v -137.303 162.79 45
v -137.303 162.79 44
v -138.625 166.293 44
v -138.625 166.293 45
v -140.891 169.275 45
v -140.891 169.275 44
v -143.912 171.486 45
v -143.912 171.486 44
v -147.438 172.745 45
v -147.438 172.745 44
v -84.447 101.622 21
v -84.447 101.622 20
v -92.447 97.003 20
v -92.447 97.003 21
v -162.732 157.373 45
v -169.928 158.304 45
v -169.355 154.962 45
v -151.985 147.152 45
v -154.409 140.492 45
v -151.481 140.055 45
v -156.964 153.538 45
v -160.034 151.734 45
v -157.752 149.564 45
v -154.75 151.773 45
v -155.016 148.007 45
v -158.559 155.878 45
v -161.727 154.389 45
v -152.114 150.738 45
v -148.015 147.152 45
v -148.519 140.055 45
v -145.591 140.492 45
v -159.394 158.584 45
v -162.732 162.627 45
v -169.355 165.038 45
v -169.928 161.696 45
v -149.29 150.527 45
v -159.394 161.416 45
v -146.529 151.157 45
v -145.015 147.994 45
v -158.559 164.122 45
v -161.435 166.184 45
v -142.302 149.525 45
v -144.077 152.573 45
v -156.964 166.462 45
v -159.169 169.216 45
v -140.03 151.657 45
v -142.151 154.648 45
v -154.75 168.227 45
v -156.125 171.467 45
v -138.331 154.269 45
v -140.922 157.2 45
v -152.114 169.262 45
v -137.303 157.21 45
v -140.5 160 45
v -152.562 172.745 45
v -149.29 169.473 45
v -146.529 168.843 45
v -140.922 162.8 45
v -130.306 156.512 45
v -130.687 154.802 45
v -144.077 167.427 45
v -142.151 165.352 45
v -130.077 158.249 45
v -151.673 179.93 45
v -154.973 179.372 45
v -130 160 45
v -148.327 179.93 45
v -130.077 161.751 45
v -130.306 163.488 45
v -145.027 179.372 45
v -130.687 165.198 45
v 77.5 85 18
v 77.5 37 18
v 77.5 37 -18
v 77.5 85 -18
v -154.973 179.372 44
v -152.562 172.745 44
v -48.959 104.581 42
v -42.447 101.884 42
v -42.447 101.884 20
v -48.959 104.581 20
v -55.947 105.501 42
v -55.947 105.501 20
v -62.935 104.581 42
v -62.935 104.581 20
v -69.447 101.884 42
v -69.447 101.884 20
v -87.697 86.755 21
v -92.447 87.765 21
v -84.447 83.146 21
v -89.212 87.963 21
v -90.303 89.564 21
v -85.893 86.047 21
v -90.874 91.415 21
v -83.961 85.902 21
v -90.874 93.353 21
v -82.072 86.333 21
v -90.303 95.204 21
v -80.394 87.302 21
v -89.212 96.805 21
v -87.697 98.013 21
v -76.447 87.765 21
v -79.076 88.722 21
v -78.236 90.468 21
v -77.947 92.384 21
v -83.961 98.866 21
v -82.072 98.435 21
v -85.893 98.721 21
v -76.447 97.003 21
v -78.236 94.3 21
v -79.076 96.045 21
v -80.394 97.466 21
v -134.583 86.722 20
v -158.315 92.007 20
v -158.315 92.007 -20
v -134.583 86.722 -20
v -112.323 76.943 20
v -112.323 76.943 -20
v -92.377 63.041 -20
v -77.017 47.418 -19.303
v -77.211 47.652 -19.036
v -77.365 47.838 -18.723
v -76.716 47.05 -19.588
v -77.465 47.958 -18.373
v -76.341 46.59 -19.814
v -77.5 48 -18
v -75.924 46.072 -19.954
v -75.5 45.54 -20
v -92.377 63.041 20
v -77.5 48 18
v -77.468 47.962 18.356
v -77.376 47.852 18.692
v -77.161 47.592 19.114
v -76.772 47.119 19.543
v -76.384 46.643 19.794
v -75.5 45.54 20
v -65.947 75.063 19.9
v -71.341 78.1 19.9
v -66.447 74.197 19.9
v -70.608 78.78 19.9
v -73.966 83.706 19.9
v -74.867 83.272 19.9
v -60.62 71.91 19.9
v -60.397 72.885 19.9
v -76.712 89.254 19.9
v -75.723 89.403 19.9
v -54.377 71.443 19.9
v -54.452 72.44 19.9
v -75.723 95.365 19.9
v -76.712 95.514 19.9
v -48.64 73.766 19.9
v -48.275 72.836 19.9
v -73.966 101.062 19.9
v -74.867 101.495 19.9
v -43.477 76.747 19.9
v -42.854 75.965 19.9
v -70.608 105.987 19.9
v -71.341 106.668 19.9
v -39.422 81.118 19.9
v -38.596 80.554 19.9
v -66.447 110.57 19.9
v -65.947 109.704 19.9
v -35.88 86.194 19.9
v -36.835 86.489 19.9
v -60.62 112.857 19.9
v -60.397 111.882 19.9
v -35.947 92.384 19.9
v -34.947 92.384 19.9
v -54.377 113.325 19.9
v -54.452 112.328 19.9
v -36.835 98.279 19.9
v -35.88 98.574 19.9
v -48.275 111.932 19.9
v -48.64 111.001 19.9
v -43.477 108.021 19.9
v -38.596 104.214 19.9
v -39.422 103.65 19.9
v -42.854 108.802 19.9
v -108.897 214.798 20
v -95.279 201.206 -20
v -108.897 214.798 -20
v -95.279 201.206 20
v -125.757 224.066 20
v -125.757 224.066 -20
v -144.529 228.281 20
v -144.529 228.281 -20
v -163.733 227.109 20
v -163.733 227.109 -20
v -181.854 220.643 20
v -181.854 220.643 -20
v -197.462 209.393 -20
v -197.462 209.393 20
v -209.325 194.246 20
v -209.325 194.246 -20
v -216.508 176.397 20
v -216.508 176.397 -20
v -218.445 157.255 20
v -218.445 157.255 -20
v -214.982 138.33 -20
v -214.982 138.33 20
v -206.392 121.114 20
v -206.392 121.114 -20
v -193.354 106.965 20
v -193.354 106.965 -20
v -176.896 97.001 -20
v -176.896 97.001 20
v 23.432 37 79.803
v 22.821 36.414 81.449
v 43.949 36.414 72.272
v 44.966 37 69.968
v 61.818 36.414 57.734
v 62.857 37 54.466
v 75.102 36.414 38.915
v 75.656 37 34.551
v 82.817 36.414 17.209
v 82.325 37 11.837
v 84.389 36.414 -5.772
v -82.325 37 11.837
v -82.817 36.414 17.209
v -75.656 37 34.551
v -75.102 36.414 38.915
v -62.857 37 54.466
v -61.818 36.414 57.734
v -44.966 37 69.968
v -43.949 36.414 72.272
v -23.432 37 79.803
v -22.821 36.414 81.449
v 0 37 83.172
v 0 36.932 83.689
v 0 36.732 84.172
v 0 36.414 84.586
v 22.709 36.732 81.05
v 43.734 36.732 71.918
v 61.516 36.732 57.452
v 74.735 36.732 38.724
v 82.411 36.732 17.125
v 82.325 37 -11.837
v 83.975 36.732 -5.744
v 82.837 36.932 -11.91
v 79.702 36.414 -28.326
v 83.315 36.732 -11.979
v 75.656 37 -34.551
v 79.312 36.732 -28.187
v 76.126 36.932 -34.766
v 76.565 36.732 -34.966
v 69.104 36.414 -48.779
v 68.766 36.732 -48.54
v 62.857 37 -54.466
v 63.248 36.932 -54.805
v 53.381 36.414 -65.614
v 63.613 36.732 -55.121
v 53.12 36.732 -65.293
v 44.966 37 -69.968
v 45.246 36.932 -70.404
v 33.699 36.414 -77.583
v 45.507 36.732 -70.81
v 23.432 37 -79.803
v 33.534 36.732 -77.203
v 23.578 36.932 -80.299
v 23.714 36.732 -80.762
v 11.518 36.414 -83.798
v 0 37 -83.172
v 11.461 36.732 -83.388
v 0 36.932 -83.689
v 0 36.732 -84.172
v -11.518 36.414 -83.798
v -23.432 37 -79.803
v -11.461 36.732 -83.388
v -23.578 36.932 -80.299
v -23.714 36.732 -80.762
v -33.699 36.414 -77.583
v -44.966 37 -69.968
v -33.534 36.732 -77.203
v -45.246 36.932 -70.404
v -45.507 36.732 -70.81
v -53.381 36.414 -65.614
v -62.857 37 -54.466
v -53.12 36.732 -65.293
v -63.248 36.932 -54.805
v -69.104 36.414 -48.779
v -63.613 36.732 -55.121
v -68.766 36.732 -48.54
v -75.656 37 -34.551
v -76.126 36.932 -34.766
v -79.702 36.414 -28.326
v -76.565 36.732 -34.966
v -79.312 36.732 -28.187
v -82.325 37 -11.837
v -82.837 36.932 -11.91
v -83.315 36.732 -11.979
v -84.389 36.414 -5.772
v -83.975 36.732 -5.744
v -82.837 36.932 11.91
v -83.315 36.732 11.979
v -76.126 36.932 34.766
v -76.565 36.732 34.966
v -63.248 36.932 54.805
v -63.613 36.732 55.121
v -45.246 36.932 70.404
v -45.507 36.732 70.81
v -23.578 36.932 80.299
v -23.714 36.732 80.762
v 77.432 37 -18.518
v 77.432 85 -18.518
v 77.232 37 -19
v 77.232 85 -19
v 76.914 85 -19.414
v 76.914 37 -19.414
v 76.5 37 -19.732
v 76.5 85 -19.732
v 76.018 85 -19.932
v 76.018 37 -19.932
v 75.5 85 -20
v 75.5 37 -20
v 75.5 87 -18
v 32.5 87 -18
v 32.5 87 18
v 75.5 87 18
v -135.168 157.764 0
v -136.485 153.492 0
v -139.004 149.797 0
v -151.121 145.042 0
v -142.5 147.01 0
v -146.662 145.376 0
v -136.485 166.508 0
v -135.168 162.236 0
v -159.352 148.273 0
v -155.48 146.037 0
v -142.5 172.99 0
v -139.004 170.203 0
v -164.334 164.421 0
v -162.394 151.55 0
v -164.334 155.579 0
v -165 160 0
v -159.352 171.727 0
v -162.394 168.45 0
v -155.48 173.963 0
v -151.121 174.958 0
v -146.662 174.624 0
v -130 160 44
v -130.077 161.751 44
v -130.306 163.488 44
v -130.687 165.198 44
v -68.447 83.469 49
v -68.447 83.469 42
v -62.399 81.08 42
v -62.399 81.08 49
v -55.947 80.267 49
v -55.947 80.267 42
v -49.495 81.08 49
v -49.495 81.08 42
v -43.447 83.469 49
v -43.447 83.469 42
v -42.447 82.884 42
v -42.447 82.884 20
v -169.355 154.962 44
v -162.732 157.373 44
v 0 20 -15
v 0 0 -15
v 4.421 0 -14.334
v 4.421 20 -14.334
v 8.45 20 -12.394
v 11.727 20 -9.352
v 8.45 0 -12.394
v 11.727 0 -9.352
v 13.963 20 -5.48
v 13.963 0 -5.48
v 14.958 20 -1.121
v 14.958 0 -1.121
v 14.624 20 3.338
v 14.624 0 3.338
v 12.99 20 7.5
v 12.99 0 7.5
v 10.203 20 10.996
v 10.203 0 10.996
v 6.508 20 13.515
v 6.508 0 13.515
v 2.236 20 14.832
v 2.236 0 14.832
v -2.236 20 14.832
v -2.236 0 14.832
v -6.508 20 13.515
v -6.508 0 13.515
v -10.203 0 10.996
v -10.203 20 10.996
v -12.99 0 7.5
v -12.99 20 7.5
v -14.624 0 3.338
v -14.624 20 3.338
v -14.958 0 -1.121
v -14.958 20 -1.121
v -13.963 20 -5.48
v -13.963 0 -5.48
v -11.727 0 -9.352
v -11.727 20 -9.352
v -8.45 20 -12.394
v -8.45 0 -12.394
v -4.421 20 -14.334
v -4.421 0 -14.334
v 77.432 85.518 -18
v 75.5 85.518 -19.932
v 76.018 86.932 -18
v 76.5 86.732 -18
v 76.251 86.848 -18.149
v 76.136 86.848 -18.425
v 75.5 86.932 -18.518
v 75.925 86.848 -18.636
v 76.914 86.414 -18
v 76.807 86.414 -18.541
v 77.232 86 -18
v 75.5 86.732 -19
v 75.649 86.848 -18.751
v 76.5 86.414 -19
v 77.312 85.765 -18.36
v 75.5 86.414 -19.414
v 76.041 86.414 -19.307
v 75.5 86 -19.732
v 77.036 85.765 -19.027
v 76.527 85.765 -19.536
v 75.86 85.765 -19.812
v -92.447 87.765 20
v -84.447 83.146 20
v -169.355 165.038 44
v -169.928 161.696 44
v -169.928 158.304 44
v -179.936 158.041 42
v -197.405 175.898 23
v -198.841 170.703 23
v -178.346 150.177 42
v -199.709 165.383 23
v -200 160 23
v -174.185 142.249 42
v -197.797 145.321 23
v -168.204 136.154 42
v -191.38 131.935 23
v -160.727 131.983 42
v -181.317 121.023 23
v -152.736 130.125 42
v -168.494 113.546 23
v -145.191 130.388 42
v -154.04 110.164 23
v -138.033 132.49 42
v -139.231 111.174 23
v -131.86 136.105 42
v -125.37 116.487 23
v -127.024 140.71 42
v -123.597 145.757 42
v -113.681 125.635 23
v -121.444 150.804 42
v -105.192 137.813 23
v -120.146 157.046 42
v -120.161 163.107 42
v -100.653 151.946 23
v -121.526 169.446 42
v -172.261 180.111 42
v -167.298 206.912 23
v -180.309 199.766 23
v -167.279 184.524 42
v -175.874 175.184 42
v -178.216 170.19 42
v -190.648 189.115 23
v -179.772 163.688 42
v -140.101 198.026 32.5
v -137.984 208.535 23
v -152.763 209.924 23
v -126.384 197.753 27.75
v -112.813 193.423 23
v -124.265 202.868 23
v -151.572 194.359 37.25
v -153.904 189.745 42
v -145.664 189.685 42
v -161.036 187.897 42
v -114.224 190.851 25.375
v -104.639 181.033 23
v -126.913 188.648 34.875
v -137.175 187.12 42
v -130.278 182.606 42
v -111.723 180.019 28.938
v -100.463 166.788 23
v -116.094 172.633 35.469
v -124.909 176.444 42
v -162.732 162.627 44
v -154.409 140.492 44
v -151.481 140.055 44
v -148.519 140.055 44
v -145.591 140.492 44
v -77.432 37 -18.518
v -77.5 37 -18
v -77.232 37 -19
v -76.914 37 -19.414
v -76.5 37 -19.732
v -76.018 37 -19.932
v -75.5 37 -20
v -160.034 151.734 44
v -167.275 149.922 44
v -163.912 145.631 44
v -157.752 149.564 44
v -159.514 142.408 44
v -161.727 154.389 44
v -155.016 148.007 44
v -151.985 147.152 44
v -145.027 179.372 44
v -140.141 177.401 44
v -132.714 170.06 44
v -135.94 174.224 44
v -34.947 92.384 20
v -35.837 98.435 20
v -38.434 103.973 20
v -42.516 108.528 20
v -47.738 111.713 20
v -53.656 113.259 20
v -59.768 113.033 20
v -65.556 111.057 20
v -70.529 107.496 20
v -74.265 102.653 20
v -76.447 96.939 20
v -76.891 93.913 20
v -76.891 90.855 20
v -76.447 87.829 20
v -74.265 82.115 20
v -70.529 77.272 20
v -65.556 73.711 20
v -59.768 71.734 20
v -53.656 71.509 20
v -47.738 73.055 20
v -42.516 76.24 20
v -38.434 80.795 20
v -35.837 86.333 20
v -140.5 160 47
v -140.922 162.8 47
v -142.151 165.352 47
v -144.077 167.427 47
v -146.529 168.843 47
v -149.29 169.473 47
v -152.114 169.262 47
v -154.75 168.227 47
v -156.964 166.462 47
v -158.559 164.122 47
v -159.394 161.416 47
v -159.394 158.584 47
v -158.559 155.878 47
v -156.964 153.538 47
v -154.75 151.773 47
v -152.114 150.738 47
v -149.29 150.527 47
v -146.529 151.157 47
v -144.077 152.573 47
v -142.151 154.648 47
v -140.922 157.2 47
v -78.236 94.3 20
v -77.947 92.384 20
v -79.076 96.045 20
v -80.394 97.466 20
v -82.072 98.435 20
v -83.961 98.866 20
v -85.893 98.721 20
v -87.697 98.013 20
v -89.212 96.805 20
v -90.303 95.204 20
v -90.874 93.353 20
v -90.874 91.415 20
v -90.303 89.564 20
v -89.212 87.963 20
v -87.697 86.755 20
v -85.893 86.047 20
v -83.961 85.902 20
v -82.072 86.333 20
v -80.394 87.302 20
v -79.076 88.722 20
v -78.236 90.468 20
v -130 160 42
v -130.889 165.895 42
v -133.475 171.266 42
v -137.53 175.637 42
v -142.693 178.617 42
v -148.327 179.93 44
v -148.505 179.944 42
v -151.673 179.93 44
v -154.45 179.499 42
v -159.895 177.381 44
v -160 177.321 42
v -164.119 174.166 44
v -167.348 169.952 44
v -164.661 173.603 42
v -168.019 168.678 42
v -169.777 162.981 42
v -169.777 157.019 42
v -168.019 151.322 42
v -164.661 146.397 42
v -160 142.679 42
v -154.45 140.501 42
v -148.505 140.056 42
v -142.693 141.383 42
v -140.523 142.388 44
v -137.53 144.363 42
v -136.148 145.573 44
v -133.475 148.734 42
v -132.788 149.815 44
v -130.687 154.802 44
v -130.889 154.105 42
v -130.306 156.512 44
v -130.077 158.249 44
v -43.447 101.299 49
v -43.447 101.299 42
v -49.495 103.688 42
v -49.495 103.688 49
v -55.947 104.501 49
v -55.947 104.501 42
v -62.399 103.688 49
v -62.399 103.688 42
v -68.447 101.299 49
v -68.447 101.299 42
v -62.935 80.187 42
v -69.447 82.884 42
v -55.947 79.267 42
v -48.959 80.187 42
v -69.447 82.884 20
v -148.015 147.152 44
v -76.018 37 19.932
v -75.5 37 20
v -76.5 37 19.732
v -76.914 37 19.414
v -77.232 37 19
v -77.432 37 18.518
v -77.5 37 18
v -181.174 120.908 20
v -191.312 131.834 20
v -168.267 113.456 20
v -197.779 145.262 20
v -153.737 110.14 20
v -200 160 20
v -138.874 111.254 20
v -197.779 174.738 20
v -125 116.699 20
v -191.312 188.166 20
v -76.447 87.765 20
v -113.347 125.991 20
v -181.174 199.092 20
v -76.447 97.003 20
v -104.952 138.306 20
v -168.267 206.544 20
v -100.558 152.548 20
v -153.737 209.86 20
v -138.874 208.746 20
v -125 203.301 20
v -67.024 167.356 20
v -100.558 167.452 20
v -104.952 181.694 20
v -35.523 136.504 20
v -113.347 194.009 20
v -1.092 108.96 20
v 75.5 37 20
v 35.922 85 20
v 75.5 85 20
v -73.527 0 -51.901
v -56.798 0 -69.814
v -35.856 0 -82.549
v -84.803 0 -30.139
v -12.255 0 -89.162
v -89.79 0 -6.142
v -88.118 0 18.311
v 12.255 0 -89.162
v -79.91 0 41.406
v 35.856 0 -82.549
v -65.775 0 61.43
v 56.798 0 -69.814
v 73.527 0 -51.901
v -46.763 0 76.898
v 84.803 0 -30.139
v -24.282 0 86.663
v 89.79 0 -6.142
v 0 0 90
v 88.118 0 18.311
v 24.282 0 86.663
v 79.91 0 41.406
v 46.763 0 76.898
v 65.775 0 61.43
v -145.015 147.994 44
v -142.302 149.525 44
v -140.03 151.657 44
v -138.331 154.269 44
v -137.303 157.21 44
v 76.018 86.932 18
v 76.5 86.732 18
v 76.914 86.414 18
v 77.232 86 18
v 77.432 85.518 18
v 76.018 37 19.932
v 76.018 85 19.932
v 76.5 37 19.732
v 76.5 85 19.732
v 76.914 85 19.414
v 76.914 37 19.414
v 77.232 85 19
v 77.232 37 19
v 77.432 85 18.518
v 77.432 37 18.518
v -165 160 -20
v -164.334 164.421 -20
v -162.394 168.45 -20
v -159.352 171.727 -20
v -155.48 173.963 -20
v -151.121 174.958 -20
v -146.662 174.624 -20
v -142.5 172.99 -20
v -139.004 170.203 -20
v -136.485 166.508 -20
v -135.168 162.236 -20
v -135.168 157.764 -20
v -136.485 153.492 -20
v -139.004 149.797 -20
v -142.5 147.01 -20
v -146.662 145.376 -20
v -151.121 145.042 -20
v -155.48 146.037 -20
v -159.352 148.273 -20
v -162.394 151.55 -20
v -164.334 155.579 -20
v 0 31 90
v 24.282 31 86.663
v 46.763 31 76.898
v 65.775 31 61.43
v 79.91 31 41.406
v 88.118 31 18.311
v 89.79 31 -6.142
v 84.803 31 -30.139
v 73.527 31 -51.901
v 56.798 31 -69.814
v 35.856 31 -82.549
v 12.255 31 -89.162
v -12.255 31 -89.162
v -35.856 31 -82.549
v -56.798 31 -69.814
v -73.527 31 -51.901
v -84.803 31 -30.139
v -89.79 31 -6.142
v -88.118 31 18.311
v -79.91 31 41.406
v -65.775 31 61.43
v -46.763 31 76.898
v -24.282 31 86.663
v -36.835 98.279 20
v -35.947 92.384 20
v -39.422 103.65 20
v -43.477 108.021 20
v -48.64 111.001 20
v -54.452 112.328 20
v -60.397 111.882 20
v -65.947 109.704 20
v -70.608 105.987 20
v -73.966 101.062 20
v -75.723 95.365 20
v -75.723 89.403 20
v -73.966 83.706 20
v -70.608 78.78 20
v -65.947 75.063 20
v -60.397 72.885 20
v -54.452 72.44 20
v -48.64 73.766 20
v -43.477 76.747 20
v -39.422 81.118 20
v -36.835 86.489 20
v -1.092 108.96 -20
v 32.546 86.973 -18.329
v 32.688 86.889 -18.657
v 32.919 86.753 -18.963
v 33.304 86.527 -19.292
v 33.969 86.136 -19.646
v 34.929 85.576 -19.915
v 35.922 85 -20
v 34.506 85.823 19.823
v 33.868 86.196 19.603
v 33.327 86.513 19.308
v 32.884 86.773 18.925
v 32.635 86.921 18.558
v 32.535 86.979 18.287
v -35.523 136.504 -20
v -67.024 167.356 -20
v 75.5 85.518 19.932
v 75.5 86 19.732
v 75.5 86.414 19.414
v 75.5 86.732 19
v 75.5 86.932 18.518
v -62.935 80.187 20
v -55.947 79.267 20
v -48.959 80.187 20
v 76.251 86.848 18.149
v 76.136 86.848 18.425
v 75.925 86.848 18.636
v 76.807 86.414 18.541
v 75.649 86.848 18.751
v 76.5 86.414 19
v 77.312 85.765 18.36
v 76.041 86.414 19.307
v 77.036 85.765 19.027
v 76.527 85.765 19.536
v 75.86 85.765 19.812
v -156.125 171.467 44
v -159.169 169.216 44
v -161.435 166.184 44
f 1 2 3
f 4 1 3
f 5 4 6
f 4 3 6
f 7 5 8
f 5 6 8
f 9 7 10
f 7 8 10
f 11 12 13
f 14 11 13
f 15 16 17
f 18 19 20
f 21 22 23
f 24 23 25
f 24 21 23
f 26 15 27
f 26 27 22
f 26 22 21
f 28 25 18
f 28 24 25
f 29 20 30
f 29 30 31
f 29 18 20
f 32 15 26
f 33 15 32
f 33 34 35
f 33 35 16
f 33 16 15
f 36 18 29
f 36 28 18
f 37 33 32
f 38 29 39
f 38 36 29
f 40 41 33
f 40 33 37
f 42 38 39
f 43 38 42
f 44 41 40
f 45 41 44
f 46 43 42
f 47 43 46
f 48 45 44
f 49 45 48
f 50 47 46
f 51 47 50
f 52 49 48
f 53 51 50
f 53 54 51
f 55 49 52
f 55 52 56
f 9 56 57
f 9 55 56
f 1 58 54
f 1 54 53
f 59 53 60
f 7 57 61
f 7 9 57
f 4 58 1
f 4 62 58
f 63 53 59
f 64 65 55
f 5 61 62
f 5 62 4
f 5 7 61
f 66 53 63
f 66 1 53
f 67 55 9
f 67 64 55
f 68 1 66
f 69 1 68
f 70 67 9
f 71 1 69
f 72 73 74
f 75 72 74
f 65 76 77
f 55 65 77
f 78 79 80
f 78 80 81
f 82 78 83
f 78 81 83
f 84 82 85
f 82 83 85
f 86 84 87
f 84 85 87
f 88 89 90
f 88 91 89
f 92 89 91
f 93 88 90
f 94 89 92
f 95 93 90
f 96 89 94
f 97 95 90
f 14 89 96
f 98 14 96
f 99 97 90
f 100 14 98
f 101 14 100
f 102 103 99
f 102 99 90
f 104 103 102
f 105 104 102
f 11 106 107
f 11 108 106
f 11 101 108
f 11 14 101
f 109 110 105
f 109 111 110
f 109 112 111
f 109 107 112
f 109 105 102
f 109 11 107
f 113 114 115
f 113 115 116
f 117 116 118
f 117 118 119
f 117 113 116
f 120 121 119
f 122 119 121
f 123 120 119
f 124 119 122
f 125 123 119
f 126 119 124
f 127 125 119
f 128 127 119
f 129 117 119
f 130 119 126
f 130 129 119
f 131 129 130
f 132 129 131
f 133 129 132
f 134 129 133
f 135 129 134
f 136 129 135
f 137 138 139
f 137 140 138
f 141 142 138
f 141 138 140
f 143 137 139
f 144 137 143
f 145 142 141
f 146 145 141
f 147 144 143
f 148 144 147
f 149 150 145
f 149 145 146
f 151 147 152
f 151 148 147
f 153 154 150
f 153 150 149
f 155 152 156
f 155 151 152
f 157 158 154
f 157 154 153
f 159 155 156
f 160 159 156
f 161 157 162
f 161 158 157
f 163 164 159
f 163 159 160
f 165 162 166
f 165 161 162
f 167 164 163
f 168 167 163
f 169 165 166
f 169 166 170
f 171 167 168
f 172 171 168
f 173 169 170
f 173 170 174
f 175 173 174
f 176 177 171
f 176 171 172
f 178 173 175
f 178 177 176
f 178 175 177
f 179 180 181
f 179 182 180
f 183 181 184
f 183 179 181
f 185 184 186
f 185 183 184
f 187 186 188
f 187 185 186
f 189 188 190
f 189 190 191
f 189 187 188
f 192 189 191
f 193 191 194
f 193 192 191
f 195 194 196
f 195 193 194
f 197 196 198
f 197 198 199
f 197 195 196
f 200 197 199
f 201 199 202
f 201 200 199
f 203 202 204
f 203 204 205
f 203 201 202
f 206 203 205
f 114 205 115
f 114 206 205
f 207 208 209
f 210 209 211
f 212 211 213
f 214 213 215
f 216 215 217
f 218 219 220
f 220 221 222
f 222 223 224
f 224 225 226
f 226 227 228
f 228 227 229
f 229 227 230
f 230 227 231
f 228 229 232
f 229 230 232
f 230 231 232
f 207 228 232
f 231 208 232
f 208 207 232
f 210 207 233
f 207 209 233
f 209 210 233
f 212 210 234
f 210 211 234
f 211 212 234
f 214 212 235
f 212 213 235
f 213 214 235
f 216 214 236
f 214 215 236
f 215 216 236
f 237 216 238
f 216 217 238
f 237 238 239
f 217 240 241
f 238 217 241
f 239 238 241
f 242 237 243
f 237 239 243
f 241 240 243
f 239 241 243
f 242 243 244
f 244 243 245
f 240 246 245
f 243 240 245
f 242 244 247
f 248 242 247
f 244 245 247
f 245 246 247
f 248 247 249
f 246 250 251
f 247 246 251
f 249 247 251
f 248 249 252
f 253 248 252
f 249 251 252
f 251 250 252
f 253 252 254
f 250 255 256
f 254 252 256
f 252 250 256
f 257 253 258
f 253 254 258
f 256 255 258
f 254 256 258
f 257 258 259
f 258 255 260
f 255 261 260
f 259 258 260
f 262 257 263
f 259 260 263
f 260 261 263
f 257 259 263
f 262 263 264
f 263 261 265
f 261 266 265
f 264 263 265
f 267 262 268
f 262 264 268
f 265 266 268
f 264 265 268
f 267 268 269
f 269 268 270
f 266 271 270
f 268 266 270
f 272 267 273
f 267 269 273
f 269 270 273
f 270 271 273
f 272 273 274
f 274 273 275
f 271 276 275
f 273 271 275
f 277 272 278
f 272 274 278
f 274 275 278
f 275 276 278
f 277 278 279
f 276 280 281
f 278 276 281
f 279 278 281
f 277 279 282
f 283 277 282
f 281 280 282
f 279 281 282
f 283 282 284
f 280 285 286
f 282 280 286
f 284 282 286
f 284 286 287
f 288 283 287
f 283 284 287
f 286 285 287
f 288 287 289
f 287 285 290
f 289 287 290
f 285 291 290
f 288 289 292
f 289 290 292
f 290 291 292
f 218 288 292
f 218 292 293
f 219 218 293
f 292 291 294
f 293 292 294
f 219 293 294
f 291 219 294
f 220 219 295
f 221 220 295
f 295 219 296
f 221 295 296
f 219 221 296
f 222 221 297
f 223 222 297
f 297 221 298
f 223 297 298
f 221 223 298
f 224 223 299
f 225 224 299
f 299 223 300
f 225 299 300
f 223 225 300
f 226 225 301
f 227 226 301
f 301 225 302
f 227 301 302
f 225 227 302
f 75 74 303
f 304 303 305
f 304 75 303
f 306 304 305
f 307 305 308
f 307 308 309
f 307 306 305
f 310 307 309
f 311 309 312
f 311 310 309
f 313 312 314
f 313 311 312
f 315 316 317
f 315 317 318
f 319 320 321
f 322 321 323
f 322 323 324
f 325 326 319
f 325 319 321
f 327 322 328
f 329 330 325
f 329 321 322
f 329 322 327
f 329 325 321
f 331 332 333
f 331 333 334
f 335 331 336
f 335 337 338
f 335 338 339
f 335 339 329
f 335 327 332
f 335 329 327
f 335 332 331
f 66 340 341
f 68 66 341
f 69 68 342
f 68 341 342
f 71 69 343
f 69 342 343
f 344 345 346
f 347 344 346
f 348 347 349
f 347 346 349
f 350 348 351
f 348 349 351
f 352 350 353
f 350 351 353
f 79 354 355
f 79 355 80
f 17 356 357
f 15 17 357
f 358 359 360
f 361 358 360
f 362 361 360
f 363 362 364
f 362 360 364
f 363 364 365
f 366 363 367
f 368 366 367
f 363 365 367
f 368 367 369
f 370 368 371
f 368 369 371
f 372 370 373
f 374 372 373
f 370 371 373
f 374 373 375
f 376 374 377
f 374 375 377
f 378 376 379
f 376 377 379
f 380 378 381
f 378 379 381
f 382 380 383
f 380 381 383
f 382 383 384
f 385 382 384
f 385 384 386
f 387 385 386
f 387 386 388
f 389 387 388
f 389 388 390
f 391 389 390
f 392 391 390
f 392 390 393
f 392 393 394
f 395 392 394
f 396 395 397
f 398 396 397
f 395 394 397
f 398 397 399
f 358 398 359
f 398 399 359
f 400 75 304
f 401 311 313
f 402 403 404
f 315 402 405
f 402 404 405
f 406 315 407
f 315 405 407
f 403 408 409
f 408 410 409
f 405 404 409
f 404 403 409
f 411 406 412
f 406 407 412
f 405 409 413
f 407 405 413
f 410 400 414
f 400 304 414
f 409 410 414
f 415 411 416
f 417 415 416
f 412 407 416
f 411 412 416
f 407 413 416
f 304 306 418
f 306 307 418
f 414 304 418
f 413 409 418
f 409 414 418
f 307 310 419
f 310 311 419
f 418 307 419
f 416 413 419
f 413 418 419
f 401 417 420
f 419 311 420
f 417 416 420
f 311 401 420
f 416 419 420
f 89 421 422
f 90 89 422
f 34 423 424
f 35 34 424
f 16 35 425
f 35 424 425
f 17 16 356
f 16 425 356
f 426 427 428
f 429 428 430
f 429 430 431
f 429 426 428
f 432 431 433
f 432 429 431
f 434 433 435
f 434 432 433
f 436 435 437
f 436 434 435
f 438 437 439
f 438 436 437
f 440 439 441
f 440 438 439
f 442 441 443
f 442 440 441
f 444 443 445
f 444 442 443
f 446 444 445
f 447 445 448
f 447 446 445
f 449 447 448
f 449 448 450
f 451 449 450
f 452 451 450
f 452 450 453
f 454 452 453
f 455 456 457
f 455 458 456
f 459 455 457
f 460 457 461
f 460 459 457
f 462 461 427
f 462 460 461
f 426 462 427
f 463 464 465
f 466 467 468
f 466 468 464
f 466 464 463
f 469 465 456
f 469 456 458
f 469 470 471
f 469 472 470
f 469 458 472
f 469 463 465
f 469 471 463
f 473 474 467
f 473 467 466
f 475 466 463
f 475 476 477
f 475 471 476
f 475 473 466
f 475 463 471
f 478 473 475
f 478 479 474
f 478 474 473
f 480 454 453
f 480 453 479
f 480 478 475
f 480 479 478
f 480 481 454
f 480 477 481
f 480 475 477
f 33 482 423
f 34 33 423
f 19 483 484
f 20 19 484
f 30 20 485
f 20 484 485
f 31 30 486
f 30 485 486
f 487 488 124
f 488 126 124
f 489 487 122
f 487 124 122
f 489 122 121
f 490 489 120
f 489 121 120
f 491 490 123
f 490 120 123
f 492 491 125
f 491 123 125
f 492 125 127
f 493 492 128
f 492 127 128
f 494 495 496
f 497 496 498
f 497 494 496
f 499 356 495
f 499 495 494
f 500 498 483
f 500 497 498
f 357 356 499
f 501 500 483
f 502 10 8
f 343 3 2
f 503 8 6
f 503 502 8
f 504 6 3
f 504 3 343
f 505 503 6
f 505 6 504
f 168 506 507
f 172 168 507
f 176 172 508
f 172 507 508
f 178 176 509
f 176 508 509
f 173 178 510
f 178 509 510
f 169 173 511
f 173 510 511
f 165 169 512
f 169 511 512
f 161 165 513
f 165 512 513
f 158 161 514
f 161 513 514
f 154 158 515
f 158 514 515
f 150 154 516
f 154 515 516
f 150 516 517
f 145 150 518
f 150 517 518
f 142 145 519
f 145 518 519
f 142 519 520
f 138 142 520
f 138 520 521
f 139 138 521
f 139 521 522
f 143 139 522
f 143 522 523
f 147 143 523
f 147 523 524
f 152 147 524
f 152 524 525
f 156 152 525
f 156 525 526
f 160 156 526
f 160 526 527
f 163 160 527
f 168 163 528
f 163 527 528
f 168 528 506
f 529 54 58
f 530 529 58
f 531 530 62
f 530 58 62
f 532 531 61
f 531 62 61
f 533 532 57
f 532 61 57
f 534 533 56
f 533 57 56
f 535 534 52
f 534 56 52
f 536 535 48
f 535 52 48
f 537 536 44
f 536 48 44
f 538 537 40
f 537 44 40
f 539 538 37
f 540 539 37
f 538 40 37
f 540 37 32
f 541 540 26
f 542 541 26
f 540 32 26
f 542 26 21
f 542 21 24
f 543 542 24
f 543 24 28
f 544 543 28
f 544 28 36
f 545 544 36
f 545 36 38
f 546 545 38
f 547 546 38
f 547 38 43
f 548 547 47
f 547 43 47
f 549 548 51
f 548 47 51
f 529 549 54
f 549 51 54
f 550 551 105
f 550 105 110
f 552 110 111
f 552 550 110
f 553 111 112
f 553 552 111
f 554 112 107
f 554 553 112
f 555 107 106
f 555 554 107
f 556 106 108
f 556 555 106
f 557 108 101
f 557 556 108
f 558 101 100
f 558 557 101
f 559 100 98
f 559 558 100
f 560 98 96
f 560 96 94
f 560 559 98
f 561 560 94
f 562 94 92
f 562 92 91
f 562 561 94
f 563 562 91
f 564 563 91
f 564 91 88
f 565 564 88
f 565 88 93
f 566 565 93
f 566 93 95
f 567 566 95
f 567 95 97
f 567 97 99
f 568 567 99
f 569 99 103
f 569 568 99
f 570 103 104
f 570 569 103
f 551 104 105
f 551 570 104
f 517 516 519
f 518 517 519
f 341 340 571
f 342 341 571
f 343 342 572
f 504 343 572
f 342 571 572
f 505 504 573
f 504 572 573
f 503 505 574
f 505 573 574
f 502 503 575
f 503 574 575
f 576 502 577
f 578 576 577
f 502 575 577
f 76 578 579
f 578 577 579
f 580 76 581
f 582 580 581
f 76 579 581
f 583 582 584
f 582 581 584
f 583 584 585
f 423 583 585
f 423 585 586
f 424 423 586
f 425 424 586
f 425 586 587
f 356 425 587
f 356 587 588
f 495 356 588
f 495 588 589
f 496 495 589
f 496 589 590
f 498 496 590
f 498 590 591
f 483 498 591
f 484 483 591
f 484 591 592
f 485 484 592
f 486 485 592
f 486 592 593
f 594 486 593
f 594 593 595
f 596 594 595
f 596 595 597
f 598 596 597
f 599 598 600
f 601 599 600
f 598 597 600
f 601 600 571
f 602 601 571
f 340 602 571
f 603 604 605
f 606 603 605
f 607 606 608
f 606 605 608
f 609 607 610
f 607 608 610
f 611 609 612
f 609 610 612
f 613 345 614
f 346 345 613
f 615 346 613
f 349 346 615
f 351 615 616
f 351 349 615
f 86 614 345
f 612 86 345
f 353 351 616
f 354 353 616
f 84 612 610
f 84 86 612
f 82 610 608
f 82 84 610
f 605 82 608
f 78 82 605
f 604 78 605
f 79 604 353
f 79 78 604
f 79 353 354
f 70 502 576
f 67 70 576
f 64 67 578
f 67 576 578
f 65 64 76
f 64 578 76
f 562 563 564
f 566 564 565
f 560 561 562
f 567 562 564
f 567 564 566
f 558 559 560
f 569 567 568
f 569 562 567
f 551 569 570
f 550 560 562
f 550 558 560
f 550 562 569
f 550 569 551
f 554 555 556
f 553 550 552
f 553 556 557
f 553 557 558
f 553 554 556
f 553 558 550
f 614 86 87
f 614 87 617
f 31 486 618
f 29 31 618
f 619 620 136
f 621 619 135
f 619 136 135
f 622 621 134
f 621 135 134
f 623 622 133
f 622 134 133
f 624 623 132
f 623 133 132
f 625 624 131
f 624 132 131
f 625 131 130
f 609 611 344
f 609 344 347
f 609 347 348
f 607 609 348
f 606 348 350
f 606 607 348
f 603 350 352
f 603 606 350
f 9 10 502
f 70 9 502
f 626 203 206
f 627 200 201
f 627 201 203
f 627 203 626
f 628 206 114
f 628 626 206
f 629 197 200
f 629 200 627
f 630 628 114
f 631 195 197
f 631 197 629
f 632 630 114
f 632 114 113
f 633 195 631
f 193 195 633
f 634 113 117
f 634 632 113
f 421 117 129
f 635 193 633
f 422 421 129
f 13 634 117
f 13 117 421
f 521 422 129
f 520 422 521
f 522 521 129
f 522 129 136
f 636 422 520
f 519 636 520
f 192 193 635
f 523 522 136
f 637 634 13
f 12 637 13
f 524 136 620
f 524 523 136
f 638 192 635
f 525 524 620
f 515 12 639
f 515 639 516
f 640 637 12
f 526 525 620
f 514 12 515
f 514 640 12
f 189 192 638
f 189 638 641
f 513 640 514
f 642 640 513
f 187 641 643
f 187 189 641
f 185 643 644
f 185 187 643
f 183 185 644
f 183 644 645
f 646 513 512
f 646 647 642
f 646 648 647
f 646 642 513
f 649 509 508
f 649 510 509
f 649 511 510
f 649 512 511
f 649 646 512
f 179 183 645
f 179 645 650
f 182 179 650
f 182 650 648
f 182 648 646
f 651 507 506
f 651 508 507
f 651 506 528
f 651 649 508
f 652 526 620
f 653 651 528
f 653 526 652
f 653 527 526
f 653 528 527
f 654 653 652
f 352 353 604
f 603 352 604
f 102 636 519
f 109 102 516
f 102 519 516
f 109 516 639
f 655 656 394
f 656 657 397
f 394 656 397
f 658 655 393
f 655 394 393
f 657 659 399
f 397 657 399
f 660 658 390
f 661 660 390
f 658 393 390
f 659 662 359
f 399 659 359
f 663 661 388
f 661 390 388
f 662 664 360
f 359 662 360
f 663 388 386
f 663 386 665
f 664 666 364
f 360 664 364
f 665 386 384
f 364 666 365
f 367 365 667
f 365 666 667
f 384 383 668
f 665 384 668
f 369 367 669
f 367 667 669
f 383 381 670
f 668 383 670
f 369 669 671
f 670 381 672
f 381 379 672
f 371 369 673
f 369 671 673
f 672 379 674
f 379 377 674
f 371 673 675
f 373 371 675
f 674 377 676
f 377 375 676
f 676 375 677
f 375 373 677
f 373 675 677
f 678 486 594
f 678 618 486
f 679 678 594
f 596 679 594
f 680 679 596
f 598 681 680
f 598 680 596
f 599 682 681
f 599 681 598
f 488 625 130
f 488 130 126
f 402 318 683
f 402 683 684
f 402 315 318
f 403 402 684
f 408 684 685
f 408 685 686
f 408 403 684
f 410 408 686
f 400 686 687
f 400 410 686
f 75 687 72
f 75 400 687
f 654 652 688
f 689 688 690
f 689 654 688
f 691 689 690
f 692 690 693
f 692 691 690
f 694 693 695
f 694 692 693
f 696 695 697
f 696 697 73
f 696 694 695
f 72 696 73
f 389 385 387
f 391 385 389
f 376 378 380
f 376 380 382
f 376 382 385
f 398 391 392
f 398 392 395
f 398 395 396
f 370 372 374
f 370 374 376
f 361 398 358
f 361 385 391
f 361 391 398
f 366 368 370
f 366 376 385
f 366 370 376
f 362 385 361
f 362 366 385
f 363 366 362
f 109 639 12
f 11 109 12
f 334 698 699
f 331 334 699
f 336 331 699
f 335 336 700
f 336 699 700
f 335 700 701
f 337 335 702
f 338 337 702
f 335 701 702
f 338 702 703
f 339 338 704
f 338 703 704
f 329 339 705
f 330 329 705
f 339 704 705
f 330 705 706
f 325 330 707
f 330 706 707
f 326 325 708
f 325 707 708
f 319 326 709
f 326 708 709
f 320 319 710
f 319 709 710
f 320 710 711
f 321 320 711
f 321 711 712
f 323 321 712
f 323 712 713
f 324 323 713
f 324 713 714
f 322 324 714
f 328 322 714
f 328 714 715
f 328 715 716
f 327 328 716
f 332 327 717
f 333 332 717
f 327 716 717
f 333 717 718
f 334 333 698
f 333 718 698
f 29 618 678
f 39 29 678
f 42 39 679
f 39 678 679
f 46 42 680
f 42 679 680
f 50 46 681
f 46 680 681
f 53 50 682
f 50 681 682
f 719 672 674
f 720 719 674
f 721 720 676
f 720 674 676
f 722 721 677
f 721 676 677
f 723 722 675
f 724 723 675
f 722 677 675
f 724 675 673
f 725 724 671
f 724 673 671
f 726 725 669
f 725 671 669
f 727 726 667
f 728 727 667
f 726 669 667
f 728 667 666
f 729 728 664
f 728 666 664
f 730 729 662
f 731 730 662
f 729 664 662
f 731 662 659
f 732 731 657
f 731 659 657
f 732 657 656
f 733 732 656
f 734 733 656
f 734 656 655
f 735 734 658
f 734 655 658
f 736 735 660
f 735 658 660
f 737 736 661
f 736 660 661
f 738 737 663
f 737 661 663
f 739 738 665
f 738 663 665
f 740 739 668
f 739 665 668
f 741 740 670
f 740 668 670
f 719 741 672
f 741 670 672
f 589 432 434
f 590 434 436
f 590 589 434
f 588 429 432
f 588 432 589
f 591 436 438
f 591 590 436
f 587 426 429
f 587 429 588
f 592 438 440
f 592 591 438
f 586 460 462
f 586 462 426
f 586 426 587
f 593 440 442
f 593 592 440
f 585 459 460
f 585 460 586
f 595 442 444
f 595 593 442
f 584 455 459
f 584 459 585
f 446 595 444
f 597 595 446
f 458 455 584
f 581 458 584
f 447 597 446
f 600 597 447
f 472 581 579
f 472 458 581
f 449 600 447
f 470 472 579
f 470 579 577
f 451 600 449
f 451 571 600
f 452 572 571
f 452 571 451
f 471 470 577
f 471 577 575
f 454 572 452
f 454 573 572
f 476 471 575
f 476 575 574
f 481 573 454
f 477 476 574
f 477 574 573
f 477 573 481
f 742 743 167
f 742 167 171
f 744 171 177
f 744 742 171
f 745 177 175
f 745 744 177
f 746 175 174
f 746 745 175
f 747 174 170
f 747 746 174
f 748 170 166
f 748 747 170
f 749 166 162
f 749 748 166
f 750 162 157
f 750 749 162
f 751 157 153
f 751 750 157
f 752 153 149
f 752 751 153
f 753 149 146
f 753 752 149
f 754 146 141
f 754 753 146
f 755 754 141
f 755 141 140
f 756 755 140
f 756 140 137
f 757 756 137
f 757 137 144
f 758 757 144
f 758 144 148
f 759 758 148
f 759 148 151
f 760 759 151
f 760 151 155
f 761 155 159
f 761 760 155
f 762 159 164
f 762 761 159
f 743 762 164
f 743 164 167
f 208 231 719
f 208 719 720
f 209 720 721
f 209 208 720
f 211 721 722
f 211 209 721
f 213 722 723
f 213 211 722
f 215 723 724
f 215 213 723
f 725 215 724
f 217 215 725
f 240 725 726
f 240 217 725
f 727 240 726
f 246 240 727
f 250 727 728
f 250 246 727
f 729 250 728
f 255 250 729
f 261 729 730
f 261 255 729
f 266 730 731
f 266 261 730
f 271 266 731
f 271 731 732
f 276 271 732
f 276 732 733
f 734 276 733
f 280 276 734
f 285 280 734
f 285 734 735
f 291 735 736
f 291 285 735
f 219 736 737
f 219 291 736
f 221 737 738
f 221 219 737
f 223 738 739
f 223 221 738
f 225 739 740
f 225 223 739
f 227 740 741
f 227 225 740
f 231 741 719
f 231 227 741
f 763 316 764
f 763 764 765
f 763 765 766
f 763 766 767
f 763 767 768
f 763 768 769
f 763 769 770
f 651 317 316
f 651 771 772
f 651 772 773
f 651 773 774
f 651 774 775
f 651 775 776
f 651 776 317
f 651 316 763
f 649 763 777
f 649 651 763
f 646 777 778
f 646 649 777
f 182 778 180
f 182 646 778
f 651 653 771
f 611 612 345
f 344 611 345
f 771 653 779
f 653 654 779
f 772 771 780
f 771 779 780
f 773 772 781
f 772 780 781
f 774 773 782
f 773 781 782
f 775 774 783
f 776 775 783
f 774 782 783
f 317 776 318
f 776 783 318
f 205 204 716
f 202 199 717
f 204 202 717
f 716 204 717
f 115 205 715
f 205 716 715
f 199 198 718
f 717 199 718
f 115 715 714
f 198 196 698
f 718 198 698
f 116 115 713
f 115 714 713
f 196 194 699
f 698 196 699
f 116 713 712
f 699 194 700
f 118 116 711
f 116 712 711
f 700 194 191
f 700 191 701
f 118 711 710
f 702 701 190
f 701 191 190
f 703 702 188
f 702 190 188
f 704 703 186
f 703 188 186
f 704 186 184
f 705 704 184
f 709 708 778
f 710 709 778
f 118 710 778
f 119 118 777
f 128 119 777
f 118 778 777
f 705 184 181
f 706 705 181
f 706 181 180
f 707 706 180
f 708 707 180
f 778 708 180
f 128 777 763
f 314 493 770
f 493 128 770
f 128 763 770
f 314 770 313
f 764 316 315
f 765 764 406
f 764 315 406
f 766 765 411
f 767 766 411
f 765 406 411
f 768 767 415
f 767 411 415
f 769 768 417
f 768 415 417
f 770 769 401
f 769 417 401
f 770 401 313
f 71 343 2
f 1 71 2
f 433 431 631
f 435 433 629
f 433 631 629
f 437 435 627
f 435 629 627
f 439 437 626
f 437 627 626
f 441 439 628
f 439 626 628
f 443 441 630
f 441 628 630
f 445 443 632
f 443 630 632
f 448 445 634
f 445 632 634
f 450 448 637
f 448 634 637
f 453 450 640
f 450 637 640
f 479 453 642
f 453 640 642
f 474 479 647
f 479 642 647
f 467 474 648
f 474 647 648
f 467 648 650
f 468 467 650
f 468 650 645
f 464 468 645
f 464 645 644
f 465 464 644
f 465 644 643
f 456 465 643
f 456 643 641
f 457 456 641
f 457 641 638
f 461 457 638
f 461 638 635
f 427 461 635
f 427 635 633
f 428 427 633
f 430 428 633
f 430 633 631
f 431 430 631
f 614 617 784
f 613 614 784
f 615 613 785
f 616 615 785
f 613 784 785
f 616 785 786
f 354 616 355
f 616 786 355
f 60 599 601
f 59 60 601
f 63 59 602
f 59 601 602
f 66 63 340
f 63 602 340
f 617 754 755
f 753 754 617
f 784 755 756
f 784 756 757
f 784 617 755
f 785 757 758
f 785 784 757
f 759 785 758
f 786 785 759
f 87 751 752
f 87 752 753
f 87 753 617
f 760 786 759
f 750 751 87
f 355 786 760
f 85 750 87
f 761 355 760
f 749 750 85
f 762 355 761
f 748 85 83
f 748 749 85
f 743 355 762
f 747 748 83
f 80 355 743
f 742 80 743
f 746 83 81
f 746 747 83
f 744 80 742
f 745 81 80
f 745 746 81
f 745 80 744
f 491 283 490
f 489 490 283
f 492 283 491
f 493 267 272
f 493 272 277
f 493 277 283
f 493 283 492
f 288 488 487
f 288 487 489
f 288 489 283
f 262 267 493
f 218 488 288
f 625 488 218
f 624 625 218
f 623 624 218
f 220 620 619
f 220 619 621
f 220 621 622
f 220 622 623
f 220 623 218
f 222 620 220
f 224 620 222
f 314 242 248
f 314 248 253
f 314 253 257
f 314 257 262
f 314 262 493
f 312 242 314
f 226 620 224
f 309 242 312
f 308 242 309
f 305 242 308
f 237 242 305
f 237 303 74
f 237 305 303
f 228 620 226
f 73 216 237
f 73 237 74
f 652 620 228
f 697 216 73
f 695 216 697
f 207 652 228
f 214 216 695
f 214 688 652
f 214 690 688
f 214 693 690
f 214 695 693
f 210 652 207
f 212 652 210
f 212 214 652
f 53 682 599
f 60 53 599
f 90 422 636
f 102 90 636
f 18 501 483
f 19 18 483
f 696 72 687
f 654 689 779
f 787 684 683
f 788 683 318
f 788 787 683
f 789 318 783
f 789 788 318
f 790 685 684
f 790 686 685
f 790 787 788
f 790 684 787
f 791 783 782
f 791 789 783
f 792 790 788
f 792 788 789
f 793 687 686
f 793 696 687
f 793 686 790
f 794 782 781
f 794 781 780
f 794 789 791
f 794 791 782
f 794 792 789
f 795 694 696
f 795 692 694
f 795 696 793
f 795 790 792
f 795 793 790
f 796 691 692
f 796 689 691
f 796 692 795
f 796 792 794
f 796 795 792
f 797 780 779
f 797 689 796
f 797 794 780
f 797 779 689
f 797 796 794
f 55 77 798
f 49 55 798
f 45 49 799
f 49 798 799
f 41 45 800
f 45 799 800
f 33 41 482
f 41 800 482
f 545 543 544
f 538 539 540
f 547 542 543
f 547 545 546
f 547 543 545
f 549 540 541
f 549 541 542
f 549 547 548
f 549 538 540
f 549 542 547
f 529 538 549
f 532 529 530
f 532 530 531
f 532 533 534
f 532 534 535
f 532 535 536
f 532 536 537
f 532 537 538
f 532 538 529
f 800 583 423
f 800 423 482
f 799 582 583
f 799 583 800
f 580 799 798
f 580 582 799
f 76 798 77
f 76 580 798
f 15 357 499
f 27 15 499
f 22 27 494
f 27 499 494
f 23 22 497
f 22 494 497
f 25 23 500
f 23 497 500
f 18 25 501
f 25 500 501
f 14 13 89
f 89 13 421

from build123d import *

# Parameters (mm, degrees)
SKETCH1_R            = 90
BOSS_EXTRUDE1_DEPTH  = 37
CHAMFER1_SIZE        = 6
SKETCH2_W            = 155
SKETCH2_H            = 40
BOSS_EXTRUDE2_DEPTH  = 50
CUT_EXTRUDE1_DEPTH   = 40
BOSS_EXTRUDE3_DEPTH  = 20
SKETCH8_R            = 50
BOSS_EXTRUDE4_DEPTH  = 3
SKETCH12_R           = 20
BOSS_EXTRUDE5_DEPTH  = 2
BOSS_EXTRUDE6_DEPTH  = 1
SKETCH14_R           = 9.5
BOSS_EXTRUDE7_DEPTH  = 2
BOSS_EXTRUDE9_DEPTH  = 22
BOSS_EXTRUDE10_DEPTH = 7
SKETCH18_R           = 6.5
BOSS_EXTRUDE11_DEPTH = 1
SKETCH19_R           = 21
SKETCH19_R_2         = 20
CUT_EXTRUDE12_DEPTH  = 0.1
FILLET1_R            = 2
SKETCH20_R           = 15
CUT_EXTRUDE13_DEPTH  = 20
SKETCH21_R           = 15
CUT_EXTRUDE14_DEPTH  = 20


with BuildPart() as part:
    # Sketch1 → Boss-Extrude1 (new body)
    with BuildSketch(Plane(origin=(0, 0, 0), x_dir=(1, 0, 0), z_dir=(0, 1, 0))):
        with Locations(Location((0, 0, 0), (0, 0, 270))):
            Circle(SKETCH1_R)
    extrude(amount=BOSS_EXTRUDE1_DEPTH)

    # Chamfer1
    chamfer1_edges = [part.edges().sort_by_distance(p)[0] for p in [
        (0, 37, -90),
    ]]
    chamfer(chamfer1_edges, length=CHAMFER1_SIZE)

    # Sketch2 → Boss-Extrude2 (add)
    with BuildSketch(Plane(origin=(0, 37, 0), x_dir=(1, 0, 0), z_dir=(0, 1, 0))):
        Rectangle(SKETCH2_W, SKETCH2_H)
    extrude(amount=BOSS_EXTRUDE2_DEPTH)

    # Sketch3 → Cut-Extrude1 (cut)
    with BuildSketch(Plane.XY.offset(20)):
        with BuildLine():
            Line((-77.5, 48), (-77.5, 87))
            Line((-77.5, 87), (32.5, 87))
            ThreePointArc((32.5, 87), (-18.551432041, 56.363013449), (-77.5, 48))
        make_face()
    extrude(amount=-CUT_EXTRUDE1_DEPTH, mode=Mode.SUBTRACT)

    # Sketch4 → Boss-Extrude3 (add, symmetric)
    with BuildSketch(Plane.XY):
        with BuildLine():
            ThreePointArc((-95.279461367, 201.205735666), (-209.325156185, 194.245814981), (-158.315351417, 92.00658171))
            ThreePointArc((-158.315351417, 92.00658171), (-113.710864551, 77.710473629), (-77.5, 48))
            ThreePointArc((-77.5, 48), (-18.551432041, 56.363013449), (32.5, 87))
            ThreePointArc((32.5, 87), (-37.003814726, 137.821531516), (-95.279461367, 201.205735666))
        make_face()
    extrude(amount=BOSS_EXTRUDE3_DEPTH, both=True)

    # Sketch8 → Boss-Extrude4 (add)
    with BuildSketch(Plane.XY.offset(20)):
        with Locations(Location((-150, 160, 0), (0, 0, 180))):
            Circle(SKETCH8_R)
    extrude(amount=BOSS_EXTRUDE4_DEPTH)

    # Loft2: read off the stored shape, not the designer's step
    # Loft2: loft between two sections, ruled curve by curve
    loft2_from = [
        Edge.make_bspline([(-197.405095184, 175.898331692, 23), (-229.201758567, 81.088141323, 23), (-134.391568199, 49.29147794, 23), (-102.594904816, 144.101668308, 23), (-70.798241433, 238.911858677, 23), (-165.608431801, 270.70852206, 23), (-197.405095184, 175.898331692, 23)], [0, 0, 0, 0, 0.5, 0.5, 0.5, 1, 1, 1, 1], 3, [1, 0.333333333, 0.333333333, 1, 0.333333333, 0.333333333, 1]),
    ]
    loft2_to = [
        Edge.make_bspline([(-179.935973003, 158.041041, 42), (-176.018055003, 98.169094994, 42), (-116.146108997, 102.087012994, 42), (-120.064026997, 161.958959, 42), (-123.981944997, 221.830905006, 42), (-183.853891003, 217.912987006, 42), (-179.935973003, 158.041041, 42)], [0, 0, 0, 0, 0.5, 0.5, 0.5, 1, 1, 1, 1], 3, [1, 0.333333333, 0.333333333, 1, 0.333333333, 0.333333333, 1]),
    ]
    loft2 = Solid(Shell([*[Face.make_surface_from_curves(loft2_from[k], loft2_to[k]) for k in range(1)], Face(Wire(loft2_from)), Face(Wire(loft2_to))]))
    add(loft2)

    # Sketch12 → Boss-Extrude5 (add)
    with BuildSketch(Plane.XY.offset(42)):
        with Locations((-150, 160)):
            Circle(SKETCH12_R)
    extrude(amount=BOSS_EXTRUDE5_DEPTH)

    # Sketch13 → Boss-Extrude6 (add)
    with BuildSketch(Plane.XY.offset(44)):
        with BuildLine():
            Line((-154.973420243, 179.371760144), (-152.561527516, 172.74513934))
            ThreePointArc((-152.561527516, 172.74513934), (-159.168635276, 169.216079816), (-162.73174885, 162.627274483))
            Line((-162.73174885, 162.627274483), (-169.355073812, 165.037967621))
            ThreePointArc((-169.355073812, 165.037967621), (-170, 160), (-169.355073812, 154.962032379))
            Line((-169.355073812, 154.962032379), (-162.73174885, 157.372725517))
            ThreePointArc((-162.73174885, 157.372725517), (-158.958779481, 150.579794577), (-151.985076295, 147.152452681))
            Line((-151.985076295, 147.152452681), (-154.409249727, 140.492090916))
            ThreePointArc((-154.409249727, 140.492090916), (-150, 140), (-145.590750273, 140.492090916))
            Line((-145.590750273, 140.492090916), (-148.014923705, 147.152452681))
            ThreePointArc((-148.014923705, 147.152452681), (-141.101752828, 150.522595436), (-137.302957602, 157.209818223))
            Line((-137.302957602, 157.209818223), (-130.687310868, 154.801919732))
            ThreePointArc((-130.687310868, 154.801919732), (-130.172572246, 157.378338566), (-130, 160))
            ThreePointArc((-130, 160), (-130.172572246, 162.621661434), (-130.687310868, 165.198080268))
            Line((-130.687310868, 165.198080268), (-137.302957602, 162.790181777))
            ThreePointArc((-137.302957602, 162.790181777), (-140.890593654, 169.274627541), (-147.438472484, 172.74513934))
            Line((-147.438472484, 172.74513934), (-145.026579757, 179.371760144))
            ThreePointArc((-145.026579757, 179.371760144), (-150, 180), (-154.973420243, 179.371760144))
        make_face()
    extrude(amount=BOSS_EXTRUDE6_DEPTH)

    # Sketch14 → Boss-Extrude7 (add)
    with BuildSketch(Plane.XY.offset(45)):
        with Locations((-150, 160)):
            Circle(SKETCH14_R)
    extrude(amount=BOSS_EXTRUDE7_DEPTH)

    # Sketch16 → Boss-Extrude9 (add)
    with BuildSketch(Plane.XY.offset(20)):
        with BuildLine():
            Line((-69.446792895, 101.883912358), (-69.446792895, 82.883912358))
            ThreePointArc((-69.446792895, 82.883912358), (-55.946792895, 79.266598261), (-42.446792895, 82.883912358))
            Line((-42.446792895, 82.883912358), (-42.446792895, 101.883912358))
            ThreePointArc((-42.446792895, 101.883912358), (-55.946792895, 105.501226456), (-69.446792895, 101.883912358))
        make_face()
    extrude(amount=BOSS_EXTRUDE9_DEPTH)

    # Sketch17 → Boss-Extrude10 (add)
    with BuildSketch(Plane.XY.offset(42)):
        with BuildLine():
            Line((-43.446792895, 83.46857203), (-43.446792895, 101.299252687))
            ThreePointArc((-43.446792895, 101.299252687), (-55.946792895, 104.501226456), (-68.446792895, 101.299252687))
            Line((-68.446792895, 101.299252687), (-68.446792895, 83.46857203))
            ThreePointArc((-68.446792895, 83.46857203), (-55.946792895, 80.266598261), (-43.446792895, 83.46857203))
        make_face()
    extrude(amount=BOSS_EXTRUDE10_DEPTH)

    # Sketch18 → Boss-Extrude11 (add)
    with BuildSketch(Plane.XY.offset(20)):
        Polygon((-84.446792895, 83.146308051), (-76.446792895, 87.765110205), (-76.446792895, 97.002714512), (-84.446792895, 101.621516665), (-92.446792895, 97.002714512), (-92.446792895, 87.765110205), align=None)
        with Locations((-84.446792895, 92.383912358)):
            Circle(SKETCH18_R, mode=Mode.SUBTRACT)
    extrude(amount=BOSS_EXTRUDE11_DEPTH)

    # Sketch19 → Cut-Extrude12 (cut)
    with BuildSketch(Plane.XY.offset(20)):
        with Locations((-55.946792895, 92.383912358)):
            Circle(SKETCH19_R)
        with Locations((-55.946792895, 92.383912358)):
            Circle(SKETCH19_R_2, mode=Mode.SUBTRACT)
    extrude(amount=-CUT_EXTRUDE12_DEPTH, mode=Mode.SUBTRACT)

    # Fillet1
    fillet1_edges = [part.edges().sort_by_distance(p)[0] for p in [
        (77.5, 62, 20),
        (77.5, 62, -20),
        (77.5, 87, 0),
        (55, 87, -20),
        (55, 87, 20),
        (-77.5, 42.5, 20),
        (-77.5, 42.5, -20),
        (0, 37, -84),
    ]]
    fillet(fillet1_edges, radius=FILLET1_R)

    # Sketch20 → Cut-Extrude13 (cut)
    with BuildSketch(Plane.XZ):
        with Locations(Location((0, 0, 0), (0, 0, 270))):
            Circle(SKETCH20_R)
    extrude(amount=-CUT_EXTRUDE13_DEPTH, mode=Mode.SUBTRACT)

    # Sketch21 → Cut-Extrude14 (cut)
    with BuildSketch(Plane(origin=(0, 0, -20), x_dir=(-1, 0, 0), z_dir=(0, 0, -1))):
        with Locations((150, 160)):
            Circle(SKETCH21_R)
    extrude(amount=-CUT_EXTRUDE14_DEPTH, mode=Mode.SUBTRACT)


solid = part.part
